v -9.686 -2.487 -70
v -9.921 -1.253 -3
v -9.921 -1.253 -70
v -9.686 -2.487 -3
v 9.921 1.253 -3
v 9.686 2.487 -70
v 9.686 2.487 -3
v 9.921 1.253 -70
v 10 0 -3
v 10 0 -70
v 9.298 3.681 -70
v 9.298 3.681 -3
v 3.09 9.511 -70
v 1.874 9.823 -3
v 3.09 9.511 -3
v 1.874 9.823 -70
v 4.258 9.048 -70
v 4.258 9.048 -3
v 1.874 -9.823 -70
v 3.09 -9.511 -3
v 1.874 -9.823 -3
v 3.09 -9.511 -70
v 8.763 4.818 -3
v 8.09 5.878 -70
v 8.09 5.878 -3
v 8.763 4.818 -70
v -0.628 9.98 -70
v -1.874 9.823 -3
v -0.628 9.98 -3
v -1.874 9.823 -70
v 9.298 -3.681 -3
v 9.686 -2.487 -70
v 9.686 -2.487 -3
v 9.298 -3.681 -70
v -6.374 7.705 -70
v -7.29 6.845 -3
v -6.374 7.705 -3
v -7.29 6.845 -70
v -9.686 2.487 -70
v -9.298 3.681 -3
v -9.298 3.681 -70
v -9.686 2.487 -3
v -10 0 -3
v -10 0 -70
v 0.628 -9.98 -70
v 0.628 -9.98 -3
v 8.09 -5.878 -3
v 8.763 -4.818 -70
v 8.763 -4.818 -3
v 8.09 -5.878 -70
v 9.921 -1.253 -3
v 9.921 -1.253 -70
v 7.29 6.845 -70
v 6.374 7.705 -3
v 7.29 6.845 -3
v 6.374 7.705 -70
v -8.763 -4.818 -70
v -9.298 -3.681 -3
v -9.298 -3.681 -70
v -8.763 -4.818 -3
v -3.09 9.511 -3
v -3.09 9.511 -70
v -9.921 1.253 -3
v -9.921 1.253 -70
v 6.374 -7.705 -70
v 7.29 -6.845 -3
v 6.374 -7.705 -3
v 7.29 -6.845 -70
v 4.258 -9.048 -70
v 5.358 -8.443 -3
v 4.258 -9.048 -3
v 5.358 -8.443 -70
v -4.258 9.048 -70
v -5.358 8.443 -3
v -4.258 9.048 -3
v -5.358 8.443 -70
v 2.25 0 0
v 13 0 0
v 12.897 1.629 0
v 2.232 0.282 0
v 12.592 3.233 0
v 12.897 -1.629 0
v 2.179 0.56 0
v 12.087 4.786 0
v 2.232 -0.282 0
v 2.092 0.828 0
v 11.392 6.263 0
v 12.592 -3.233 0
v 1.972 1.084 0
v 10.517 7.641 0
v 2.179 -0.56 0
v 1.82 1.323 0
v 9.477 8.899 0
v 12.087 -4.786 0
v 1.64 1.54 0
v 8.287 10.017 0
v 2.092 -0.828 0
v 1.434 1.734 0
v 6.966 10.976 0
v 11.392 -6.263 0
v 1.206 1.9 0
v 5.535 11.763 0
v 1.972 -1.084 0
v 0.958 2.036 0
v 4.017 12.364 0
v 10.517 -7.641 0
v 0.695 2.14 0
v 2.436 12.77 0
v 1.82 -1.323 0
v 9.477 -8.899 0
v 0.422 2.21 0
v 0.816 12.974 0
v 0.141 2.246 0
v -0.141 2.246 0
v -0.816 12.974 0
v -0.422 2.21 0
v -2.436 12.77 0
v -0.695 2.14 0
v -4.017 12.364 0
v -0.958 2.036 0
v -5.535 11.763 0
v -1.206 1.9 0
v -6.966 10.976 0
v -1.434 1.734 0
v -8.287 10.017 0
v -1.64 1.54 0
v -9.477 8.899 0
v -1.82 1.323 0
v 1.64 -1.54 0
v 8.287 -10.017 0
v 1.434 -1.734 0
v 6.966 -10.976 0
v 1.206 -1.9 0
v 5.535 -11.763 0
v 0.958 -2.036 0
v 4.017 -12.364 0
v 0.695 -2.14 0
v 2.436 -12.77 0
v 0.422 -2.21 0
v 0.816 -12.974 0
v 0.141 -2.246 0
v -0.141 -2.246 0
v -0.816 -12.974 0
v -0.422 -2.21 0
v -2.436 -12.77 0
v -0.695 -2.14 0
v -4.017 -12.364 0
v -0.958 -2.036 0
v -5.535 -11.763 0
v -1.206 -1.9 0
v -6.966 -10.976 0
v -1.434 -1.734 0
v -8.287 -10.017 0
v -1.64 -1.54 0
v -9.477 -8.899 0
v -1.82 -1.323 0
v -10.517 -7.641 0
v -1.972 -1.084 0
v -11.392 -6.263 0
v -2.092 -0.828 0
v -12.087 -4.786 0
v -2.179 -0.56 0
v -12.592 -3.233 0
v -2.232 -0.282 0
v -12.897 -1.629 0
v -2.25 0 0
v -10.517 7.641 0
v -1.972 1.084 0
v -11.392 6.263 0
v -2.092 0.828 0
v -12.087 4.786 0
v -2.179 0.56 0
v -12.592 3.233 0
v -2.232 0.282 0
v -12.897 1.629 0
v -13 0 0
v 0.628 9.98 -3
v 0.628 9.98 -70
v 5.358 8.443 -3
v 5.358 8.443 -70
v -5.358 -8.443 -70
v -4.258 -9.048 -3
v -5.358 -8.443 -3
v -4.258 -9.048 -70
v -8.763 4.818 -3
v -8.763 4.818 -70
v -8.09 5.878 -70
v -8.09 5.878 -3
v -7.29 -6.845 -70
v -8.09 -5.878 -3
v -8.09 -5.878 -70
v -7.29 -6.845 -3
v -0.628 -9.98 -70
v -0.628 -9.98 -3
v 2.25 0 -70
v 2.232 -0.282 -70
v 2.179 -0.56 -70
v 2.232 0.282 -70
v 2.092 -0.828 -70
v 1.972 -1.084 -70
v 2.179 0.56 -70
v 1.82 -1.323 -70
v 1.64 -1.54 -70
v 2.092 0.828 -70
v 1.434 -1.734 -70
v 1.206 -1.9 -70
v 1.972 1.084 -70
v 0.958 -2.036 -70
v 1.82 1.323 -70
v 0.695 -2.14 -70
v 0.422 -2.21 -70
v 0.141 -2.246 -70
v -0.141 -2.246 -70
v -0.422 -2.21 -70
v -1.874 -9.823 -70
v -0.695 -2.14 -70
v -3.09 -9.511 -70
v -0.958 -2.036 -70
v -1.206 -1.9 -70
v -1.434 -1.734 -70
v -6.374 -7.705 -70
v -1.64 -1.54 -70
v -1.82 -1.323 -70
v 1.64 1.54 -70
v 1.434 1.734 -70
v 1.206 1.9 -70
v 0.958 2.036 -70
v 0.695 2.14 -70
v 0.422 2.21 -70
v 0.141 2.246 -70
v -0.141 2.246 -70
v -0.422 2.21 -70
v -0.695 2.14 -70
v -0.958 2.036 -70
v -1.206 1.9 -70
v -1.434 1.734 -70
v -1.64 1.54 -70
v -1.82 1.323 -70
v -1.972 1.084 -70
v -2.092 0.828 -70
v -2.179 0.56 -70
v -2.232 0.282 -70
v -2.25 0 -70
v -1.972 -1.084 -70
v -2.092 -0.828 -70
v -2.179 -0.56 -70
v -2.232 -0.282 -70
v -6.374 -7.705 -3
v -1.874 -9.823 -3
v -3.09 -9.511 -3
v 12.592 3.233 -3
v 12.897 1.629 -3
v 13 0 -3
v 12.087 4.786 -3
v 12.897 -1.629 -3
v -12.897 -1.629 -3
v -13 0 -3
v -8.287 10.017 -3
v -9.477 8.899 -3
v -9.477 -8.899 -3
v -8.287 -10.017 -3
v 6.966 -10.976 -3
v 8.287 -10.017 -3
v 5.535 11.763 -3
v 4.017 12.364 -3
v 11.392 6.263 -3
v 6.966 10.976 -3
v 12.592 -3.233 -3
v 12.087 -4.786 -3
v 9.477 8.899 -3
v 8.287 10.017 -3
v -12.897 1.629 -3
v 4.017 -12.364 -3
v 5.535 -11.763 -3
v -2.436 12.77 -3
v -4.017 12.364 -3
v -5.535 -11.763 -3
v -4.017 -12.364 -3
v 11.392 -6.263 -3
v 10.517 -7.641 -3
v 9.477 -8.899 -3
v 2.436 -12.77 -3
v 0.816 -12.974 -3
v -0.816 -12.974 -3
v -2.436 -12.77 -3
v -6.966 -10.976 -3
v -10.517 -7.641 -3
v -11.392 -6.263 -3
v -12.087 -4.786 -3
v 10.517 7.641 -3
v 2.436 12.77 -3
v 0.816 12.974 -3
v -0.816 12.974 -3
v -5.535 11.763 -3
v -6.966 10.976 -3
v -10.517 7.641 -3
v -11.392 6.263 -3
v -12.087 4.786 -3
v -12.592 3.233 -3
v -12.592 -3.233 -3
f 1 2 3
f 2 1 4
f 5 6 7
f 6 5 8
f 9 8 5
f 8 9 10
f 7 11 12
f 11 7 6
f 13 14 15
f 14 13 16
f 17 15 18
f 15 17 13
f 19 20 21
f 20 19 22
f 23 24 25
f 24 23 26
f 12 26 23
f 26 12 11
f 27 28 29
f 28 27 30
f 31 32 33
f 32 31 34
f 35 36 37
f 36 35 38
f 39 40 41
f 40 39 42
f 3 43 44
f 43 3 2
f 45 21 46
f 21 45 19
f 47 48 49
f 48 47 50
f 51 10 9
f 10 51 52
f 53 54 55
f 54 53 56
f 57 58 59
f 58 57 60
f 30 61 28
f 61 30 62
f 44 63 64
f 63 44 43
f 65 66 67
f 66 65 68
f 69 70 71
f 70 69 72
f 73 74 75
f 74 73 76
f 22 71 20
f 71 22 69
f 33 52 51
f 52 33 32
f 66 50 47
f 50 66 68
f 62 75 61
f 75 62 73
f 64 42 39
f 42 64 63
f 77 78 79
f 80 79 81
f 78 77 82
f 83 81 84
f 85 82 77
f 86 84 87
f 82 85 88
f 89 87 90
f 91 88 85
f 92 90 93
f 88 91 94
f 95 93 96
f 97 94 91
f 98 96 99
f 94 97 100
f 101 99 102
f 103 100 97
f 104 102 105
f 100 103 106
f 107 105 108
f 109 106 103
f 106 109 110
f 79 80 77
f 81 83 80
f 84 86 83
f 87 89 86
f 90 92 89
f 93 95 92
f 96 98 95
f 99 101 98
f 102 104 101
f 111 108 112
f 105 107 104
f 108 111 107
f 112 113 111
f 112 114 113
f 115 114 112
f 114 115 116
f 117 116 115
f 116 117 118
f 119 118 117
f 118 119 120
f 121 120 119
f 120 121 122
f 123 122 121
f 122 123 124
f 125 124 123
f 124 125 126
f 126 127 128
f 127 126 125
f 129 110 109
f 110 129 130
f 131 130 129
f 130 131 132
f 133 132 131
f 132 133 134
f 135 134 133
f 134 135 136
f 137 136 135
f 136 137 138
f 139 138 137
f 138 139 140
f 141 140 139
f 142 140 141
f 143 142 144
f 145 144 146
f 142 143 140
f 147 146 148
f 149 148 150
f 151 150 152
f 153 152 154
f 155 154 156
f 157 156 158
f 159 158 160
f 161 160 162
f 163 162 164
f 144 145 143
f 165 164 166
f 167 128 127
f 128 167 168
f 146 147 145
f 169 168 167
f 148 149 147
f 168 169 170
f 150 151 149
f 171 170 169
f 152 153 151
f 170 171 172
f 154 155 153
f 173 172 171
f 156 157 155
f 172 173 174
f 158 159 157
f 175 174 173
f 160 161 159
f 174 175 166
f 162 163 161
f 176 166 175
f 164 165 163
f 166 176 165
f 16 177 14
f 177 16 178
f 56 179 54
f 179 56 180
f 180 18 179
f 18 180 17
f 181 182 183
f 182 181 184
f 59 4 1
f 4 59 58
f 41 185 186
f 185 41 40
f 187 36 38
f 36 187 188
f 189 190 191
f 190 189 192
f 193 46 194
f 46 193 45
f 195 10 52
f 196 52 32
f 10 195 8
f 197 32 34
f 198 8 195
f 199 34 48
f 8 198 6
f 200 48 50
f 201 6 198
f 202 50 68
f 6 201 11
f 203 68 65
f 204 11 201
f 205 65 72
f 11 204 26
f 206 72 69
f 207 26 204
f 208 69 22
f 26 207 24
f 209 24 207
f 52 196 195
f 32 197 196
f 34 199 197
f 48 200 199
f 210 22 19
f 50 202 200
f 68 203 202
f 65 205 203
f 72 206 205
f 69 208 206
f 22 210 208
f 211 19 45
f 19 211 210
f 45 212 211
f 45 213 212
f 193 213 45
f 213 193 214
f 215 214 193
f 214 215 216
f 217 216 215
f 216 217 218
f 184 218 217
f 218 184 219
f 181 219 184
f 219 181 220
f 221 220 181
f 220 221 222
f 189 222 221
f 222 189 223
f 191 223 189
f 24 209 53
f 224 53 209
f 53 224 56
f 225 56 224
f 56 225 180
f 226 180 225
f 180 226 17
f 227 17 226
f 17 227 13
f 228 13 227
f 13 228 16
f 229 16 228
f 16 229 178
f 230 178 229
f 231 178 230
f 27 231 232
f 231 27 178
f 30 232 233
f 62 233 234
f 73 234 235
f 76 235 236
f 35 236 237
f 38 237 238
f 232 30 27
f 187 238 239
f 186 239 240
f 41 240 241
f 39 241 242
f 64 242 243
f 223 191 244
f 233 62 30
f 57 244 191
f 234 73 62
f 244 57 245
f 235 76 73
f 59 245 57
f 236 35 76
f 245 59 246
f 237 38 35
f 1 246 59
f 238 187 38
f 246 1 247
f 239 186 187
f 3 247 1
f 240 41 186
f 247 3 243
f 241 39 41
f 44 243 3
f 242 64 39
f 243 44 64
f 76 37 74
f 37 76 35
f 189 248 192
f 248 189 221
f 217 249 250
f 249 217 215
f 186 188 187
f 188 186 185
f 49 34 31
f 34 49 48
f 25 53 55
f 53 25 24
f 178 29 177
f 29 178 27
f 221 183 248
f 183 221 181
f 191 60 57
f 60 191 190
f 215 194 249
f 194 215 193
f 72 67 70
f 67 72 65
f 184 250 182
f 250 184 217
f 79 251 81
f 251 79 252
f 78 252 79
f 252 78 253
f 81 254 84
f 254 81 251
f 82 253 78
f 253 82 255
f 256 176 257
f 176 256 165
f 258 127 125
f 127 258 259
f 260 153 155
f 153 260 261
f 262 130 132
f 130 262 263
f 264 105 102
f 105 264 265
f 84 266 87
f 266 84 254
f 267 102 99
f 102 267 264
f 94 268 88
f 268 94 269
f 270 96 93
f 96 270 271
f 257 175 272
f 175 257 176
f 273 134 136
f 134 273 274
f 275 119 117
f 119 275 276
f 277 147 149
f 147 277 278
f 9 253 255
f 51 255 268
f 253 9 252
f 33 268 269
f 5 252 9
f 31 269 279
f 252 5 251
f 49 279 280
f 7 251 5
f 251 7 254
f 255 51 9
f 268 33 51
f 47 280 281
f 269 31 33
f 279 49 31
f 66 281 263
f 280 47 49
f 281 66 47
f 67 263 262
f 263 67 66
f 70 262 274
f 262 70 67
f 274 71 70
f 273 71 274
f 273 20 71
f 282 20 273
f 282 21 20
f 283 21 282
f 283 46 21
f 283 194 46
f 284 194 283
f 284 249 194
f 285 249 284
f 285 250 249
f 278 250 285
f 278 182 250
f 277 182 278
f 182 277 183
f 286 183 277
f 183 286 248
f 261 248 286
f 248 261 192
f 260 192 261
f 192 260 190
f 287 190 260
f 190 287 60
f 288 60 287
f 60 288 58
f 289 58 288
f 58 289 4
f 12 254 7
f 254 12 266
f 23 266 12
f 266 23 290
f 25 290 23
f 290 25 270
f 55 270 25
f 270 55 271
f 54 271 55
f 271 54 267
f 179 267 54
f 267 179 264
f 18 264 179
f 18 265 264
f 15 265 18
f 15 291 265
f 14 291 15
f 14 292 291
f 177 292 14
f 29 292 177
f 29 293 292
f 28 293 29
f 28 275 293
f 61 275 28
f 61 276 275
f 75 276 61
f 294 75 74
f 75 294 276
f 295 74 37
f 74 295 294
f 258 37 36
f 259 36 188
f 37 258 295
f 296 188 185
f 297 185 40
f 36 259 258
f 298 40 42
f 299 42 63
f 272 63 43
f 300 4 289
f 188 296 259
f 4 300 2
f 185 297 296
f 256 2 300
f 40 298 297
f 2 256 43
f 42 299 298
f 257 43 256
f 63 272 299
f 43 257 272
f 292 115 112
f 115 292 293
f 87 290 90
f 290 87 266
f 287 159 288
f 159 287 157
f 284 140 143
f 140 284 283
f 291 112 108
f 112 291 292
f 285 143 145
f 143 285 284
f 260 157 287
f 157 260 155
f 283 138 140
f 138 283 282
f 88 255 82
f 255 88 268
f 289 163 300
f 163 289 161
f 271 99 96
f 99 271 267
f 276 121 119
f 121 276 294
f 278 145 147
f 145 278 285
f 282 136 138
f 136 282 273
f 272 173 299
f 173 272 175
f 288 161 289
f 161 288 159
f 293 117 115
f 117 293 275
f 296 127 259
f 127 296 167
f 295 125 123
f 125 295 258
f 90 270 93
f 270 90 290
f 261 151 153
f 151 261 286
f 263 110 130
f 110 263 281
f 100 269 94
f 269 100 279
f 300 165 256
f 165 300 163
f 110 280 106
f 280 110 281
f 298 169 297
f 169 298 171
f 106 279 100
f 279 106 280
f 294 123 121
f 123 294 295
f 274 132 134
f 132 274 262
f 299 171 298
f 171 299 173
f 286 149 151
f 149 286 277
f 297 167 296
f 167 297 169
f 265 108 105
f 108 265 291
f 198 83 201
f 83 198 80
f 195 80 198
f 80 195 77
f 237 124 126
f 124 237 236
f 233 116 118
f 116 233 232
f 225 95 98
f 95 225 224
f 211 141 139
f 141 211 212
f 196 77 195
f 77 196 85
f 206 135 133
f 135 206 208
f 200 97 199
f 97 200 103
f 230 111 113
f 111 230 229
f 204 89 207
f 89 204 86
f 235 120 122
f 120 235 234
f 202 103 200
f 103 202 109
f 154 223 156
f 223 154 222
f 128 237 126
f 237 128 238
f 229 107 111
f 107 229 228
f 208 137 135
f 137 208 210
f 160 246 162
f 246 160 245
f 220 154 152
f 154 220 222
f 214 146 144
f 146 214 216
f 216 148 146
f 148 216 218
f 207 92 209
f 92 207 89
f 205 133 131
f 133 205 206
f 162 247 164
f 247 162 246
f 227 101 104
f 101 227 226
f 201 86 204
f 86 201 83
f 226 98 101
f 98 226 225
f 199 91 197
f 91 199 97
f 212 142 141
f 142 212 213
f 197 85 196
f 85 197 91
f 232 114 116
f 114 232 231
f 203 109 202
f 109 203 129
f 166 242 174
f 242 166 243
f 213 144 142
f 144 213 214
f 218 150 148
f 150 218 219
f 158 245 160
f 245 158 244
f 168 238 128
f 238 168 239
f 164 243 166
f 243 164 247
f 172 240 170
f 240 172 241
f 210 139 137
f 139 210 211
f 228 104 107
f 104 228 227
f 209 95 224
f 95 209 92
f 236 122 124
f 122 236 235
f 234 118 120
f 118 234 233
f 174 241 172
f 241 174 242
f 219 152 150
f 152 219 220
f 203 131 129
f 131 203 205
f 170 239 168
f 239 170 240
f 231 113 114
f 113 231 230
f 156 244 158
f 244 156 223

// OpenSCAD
$fn = 50;


difference() {
	union() {
		translate(v = [0, 0, -70.0000000000]) {
			cylinder(h = 70, r = 10.0000000000);
		}
		translate(v = [0, 0, -3.0000000000]) {
			cylinder(h = 3, r = 13.0000000000);
		}
	}
	union() {
		#translate(v = [0, 0, -70]) {
			cylinder(h = 70, r = 2.2500000000);
		}
	}
}
